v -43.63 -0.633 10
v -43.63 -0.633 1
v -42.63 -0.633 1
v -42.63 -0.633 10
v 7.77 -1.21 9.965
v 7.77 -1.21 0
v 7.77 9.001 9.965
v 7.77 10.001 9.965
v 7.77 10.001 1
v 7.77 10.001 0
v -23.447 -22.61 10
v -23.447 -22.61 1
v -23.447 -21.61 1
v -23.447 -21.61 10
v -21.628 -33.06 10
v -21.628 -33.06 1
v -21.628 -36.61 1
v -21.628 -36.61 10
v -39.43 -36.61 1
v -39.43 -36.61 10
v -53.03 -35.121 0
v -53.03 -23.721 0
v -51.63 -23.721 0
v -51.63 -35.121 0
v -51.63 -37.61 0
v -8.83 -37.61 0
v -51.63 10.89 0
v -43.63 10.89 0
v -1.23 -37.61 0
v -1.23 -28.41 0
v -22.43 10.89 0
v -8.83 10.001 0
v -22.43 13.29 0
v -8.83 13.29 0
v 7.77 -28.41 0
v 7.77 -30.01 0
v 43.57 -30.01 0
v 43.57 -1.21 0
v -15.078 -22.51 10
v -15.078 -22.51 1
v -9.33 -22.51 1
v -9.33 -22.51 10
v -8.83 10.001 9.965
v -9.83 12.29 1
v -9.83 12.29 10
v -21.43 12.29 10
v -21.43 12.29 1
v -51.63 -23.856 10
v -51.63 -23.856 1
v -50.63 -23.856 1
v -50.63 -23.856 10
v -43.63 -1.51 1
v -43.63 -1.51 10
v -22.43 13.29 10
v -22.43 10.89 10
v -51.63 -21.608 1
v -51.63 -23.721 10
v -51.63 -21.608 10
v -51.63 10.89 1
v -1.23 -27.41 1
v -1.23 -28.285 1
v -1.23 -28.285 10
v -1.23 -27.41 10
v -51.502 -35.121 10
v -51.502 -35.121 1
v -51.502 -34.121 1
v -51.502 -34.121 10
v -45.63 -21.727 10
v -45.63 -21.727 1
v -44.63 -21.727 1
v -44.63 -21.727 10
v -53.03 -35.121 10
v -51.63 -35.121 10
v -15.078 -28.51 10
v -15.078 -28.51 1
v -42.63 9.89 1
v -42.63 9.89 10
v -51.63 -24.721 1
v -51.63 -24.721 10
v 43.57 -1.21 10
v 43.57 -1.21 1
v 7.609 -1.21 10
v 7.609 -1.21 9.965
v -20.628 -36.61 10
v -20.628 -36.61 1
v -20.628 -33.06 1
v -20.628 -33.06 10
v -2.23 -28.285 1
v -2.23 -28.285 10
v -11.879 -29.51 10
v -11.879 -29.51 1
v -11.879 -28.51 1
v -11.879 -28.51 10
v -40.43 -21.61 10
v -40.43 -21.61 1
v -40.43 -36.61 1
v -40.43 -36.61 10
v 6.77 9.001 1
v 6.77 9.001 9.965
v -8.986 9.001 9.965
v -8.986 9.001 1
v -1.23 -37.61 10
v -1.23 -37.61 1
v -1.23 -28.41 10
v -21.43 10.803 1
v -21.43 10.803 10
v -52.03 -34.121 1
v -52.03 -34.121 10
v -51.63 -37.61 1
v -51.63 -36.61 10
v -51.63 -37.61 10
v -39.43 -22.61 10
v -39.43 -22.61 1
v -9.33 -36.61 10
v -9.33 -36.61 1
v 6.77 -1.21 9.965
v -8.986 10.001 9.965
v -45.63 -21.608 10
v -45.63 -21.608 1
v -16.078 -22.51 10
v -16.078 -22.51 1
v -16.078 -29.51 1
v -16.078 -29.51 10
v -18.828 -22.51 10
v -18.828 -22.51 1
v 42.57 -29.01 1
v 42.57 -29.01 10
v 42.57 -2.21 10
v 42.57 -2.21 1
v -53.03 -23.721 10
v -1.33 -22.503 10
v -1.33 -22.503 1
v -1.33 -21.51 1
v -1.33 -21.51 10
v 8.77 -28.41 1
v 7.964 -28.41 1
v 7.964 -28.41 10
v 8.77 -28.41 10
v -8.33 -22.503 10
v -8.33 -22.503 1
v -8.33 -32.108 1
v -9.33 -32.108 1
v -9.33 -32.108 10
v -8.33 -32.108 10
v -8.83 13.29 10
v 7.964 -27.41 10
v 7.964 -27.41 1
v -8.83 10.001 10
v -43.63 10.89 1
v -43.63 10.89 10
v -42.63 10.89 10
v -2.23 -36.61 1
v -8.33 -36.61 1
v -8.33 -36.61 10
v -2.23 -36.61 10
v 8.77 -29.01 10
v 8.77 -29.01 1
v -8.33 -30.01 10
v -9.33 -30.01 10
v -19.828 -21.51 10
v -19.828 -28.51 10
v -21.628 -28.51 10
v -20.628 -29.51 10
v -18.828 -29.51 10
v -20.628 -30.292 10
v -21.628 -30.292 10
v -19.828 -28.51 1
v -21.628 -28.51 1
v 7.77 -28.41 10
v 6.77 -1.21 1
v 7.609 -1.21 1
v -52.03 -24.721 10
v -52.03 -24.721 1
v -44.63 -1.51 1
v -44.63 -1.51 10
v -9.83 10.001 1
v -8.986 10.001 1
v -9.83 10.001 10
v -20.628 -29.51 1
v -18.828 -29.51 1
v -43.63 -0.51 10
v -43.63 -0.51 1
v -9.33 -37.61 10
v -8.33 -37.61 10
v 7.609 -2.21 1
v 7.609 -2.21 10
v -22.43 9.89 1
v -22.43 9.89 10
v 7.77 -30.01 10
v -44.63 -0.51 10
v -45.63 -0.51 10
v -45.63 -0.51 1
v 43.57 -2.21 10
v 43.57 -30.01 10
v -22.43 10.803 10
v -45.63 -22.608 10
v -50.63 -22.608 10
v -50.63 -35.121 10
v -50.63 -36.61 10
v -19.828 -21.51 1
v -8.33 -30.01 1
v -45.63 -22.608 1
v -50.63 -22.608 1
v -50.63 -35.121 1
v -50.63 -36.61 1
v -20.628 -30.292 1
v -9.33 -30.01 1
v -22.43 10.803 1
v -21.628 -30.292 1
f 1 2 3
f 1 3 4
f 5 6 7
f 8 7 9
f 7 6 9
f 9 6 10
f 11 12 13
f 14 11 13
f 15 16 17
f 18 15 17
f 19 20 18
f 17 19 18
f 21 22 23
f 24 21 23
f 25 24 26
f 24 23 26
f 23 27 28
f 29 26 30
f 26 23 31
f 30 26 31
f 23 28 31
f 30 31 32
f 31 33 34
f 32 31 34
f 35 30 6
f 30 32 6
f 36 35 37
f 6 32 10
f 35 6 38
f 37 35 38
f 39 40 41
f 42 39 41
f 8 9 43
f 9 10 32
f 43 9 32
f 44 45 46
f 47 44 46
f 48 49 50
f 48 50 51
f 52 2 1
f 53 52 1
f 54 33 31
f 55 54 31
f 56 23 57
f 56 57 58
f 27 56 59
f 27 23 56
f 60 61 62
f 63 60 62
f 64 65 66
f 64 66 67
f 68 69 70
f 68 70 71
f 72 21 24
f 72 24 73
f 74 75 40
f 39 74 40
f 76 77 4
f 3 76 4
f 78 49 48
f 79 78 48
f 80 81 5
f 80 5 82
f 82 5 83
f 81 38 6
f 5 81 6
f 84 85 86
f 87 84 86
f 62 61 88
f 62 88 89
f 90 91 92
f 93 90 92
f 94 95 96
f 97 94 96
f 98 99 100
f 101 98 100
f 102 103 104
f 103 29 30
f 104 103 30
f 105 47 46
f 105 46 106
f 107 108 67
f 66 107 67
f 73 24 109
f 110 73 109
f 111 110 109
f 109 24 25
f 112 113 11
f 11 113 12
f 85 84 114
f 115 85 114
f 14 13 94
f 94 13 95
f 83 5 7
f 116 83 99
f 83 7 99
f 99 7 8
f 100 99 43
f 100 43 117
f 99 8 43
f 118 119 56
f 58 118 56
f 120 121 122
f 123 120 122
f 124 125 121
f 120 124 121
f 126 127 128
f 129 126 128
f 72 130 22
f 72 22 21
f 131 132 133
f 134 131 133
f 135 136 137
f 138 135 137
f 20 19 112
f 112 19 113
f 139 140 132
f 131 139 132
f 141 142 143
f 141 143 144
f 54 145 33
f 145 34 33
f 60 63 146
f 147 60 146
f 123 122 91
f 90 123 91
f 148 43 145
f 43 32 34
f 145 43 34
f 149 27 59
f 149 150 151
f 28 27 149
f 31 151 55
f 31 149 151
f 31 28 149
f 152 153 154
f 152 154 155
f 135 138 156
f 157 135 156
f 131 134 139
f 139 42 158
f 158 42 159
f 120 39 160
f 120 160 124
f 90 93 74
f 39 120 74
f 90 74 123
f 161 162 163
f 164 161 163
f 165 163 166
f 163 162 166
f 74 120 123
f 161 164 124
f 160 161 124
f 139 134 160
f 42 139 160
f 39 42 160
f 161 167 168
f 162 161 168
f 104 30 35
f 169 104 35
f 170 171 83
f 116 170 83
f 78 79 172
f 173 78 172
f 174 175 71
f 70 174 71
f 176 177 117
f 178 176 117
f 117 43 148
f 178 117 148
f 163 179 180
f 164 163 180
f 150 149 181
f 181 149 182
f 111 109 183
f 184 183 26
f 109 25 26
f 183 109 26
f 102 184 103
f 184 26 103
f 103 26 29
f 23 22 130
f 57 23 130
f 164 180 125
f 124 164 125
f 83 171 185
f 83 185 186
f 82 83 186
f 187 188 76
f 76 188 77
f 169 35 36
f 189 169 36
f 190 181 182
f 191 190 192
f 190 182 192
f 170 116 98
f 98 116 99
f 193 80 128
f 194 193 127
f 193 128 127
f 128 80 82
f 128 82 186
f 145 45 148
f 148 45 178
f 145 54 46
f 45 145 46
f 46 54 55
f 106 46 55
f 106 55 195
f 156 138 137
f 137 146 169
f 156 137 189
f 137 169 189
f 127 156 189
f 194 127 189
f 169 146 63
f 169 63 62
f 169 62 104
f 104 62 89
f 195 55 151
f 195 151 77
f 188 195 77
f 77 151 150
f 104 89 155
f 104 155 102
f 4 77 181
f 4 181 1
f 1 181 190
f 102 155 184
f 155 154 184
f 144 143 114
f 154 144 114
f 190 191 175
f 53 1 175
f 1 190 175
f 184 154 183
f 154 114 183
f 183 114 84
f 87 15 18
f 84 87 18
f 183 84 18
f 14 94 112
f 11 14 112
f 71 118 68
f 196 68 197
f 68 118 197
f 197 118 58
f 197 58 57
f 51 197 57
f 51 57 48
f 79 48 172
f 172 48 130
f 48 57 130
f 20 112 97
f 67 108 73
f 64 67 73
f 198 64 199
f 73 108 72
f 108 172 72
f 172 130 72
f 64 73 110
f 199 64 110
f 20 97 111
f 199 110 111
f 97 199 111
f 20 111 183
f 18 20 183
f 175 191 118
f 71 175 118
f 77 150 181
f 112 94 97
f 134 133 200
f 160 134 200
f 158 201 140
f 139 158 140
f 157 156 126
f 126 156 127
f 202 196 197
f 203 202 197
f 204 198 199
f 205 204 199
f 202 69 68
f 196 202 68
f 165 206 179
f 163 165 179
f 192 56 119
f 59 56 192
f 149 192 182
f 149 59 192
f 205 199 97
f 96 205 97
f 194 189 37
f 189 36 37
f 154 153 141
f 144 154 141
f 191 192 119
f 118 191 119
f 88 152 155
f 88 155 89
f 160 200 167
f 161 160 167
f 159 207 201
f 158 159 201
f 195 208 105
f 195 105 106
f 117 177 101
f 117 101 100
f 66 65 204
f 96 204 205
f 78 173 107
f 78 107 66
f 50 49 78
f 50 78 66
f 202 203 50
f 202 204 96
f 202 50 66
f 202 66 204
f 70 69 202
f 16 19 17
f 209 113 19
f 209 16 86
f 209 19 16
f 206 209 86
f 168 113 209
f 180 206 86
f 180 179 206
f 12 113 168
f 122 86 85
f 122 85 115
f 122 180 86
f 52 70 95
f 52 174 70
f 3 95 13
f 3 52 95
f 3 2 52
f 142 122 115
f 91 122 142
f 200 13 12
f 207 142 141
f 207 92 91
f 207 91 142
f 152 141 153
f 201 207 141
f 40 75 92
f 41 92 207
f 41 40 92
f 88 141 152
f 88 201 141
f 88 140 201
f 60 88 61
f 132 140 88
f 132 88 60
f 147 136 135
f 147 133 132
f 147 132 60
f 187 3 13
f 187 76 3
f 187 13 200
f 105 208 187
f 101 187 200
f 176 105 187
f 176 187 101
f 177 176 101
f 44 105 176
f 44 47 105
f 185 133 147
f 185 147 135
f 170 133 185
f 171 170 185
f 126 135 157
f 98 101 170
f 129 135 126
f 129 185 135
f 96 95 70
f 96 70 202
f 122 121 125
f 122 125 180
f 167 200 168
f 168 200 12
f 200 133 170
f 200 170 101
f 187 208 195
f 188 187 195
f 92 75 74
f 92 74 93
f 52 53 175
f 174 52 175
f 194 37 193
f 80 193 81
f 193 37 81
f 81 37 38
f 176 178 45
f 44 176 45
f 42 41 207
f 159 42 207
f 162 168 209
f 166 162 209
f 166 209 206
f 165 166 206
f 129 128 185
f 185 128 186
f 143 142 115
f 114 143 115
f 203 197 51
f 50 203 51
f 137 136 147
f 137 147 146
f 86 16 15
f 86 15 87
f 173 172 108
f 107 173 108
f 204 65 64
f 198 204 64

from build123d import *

# Parameters (mm, degrees)
F0_W      = 6
F0_H      = 0.002
F0_W_2    = 1.4
F0_H_2    = 11.4
F0_W_3    = 13.6
F0_H_3    = 0.08
F0_H_4    = 16.002
F0_W_4    = 8.8
F0_H_5    = 21.098
F0_W_5    = 7.6
F0_H_6    = 7.8852218396
F1_DEPTH  = 1
F2_W      = 11.4
F2_H      = 9
F3_DEPTH  = 1
F4_W      = 1.4
F4_H      = 10
F5_DEPTH  = 1
F6_W      = 2.2483316878
F6_H      = 10
F7_DEPTH  = 1
F8_W      = 6
F8_H      = 10
F9_DEPTH  = 1
F10_W     = 21.2175605533
F10_H     = 10
F11_DEPTH = 1
F12_W     = 2
F12_H     = 10
F13_DEPTH = 1
F14_W     = 11.5231698511
F14_H     = 10
F15_DEPTH = 1
F16_W     = 21.2
F16_H     = 10
F17_DEPTH = 1
F18_W     = 2.4870870446
F18_H     = 10
F19_DEPTH = 1
F20_W     = 13.6
F20_H     = 10
F21_DEPTH = 1
F22_W     = 3.2888815676
F22_H     = 10
F23_DEPTH = 1
F24_W     = 16.7565354139
F24_H     = 9.9645610899
F25_DEPTH = 1
F26_W     = 11.2111184324
F26_H     = 9.9645610899
F27_DEPTH = 1
F28_W     = 35.9614706893
F28_H     = 10
F29_DEPTH = 1
F30_W     = 28.8
F30_H     = 10
F31_DEPTH = 1
F32_W     = 35.8
F32_H     = 10
F33_DEPTH = 1
F34_W     = 1.6
F34_H     = 10
F35_DEPTH = 1
F36_W     = 9.1939088942
F36_H     = 10
F37_DEPTH = 1
F38_W     = 9.3250730319
F38_H     = 10
F39_DEPTH = 1
F40_W     = 49.9146888159
F40_H     = 10
F41_DEPTH = 1
F42_W     = 50.4
F42_H     = 10
F43_DEPTH = 25.4
F44_W     = 2.4892
F44_H     = 10
F45_DEPTH = 1
F46_W     = 1.5276186168
F46_H     = 10
F47_DEPTH = 1
F48_W     = 8
F48_H     = 32.498
F49_DEPTH = 1
F50_W     = 1
F50_H     = 15
F50_H_2   = 1
F50_W_2   = 15.9833405107
F50_H_3   = 4.55
F50_H_4   = 2.7679902027
F50_H_5   = 0.7820097973
F50_H_6   = 6
F50_W_3   = 2.749538143
F50_H_7   = 7.5
F50_W_4   = 3.1995763704
F50_H_8   = 2.0981409718
F50_H_9   = 5.5018590282
F51_DEPTH = 9
F52_DEPTH = 9
F53_DEPTH = 9


with BuildPart() as f1:
    # F0 (on Top) → F1 (new body)
    with BuildSketch(Plane.XY):
        with Locations((-48.6298836529, -21.6088678897)):
            Rectangle(F0_W, F0_H)
        Polygon((-45.6298836529, -21.6098678897), (-51.6298836529, -21.6098678897), (-51.6298836529, -23.7206678897), (-51.6298836529, -35.1206678897), (-51.6298836529, -37.6098678897), (-40.4298836529, -37.6098678897), (-40.4298836529, -21.6098678897), align=None)
        Polygon((-45.6298836529, -21.6078678897), (-45.6298836529, -21.6098678897), (-40.4298836529, -21.6098678897), (-31.2298836529, -21.6098678897), (-31.2298836529, -21.6078678897), align=None)
        with Locations((-52.3298836529, -29.4206678897)):
            Rectangle(F0_W_2, F0_H_2)
        Polygon((-31.2298836529, -21.6098678897), (-40.4298836529, -21.6098678897), (-40.4298836529, -37.6098678897), (-22.4298836529, -37.6098678897), (-22.4298836529, -21.6078678897), (-31.2298836529, -21.6078678897), align=None)
        Polygon((-45.6298836529, -0.5098678897), (-45.6298836529, -21.6078678897), (-31.2298836529, -21.6078678897), (-31.2298836529, -0.5098678897), (-43.6298836529, -0.5098678897), align=None)
        with Locations((-15.6298836529, -37.6498678897)):
            Rectangle(F0_W_3, F0_H_3)
        with Locations((-15.6298836529, -29.6088678897)):
            Rectangle(F0_W_3, F0_H_4)
        Polygon((-43.6298836529, 10.8901321103), (-43.6298836529, -0.5098678897), (-31.2298836529, -0.5098678897), (-22.4298836529, -0.5098678897), (-22.4298836529, 10.8901321103), align=None)
        Polygon((-22.4298836529, -0.5098678897), (-22.4298836529, -21.6078678897), (-8.8298836529, -21.6078678897), (-8.8298836529, -13.7226460502), (-8.8298836529, 10.0012505427), (-8.8298836529, 13.2901321103), (-22.4298836529, 13.2901321103), (-22.4298836529, 10.8901321103), align=None)
        Polygon((-8.8298836529, -21.6078678897), (-8.8298836529, -37.6098678897), (-1.2298836529, -37.6098678897), (-1.2298836529, -28.4098678897), (-1.2298836529, -21.6078678897), align=None)
        Polygon((-8.8298836529, 10.0012505427), (-8.8298836529, -13.7226460502), (-1.2298836529, -13.7226460502), (7.7701163471, -13.7226460502), (7.7701163471, -1.2098678897), (7.7701163471, 10.0012505427), align=None)
        Polygon((-1.2298836529, -13.7226460502), (-1.2298836529, -21.6078678897), (-1.2298836529, -28.4098678897), (7.7701163471, -28.4098678897), (7.7701163471, -13.7226460502), align=None)
        Polygon((7.7701163471, -13.7226460502), (7.7701163471, -28.4098678897), (7.7701163471, -30.0098678897), (43.5701163471, -30.0098678897), (43.5701163471, -1.2098678897), (7.7701163471, -1.2098678897), align=None)
        with Locations((-26.8298836529, -11.0588678897)):
            Rectangle(F0_W_4, F0_H_5)
        with Locations((-5.0298836529, -17.6652569699)):
            Rectangle(F0_W_5, F0_H_6)
    extrude(amount=F1_DEPTH)

    # F2 (on face) → F3 (join)
    with BuildSketch(Plane(origin=(-53.0298836529, 0, 0), x_dir=(0, -1, 0), z_dir=(-1, 0, 0))):
        with Locations((29.4206678897, 5.5)):
            Rectangle(F2_W, F2_H)
    extrude(amount=-F3_DEPTH)

    # F4 (on face) → F5 (join)
    with BuildSketch(Plane(origin=(0, -23.7206678897, 0), x_dir=(-1, 0, 0), z_dir=(0, 1, 0))):
        with Locations((52.3298836529, 5)):
            Rectangle(F4_W, F4_H)
    extrude(amount=-F5_DEPTH)

    # F6 (on face) → F7 (join)
    with BuildSketch(Plane(origin=(-51.6298836529, 0, 0), x_dir=(0, -1, 0), z_dir=(-1, 0, 0))):
        with Locations((22.7320337336, 5)):
            Rectangle(F6_W, F6_H)
    extrude(amount=-F7_DEPTH)

    # F8 (on face) → F9 (join)
    with BuildSketch(Plane(origin=(0, -21.6078678897, 0), x_dir=(-1, 0, 0), z_dir=(0, 1, 0))):
        with Locations((48.6298836529, 5)):
            Rectangle(F8_W, F8_H)
    extrude(amount=-F9_DEPTH)

    # F10 (on face) → F11 (join)
    with BuildSketch(Plane(origin=(-45.6298836529, 0, 0), x_dir=(0, -1, 0), z_dir=(-1, 0, 0))):
        with Locations((11.1186481663, 5)):
            Rectangle(F10_W, F10_H)
    extrude(amount=-F11_DEPTH)

    # F12 (on face) → F13 (join)
    with BuildSketch(Plane(origin=(0, -0.5098678897, 0), x_dir=(-1, 0, 0), z_dir=(0, 1, 0))):
        with Locations((44.6298836529, 5)):
            Rectangle(F12_W, F12_H)
    extrude(amount=-F13_DEPTH)

    # F14 (on face) → F15 (join)
    with BuildSketch(Plane(origin=(-43.6298836529, 0, 0), x_dir=(0, -1, 0), z_dir=(-1, 0, 0))):
        with Locations((-5.1285471847, 5)):
            Rectangle(F14_W, F14_H)
    extrude(amount=-F15_DEPTH)

    # F16 (on face) → F17 (join)
    with BuildSketch(Plane(origin=(0, 10.8901321103, 0), x_dir=(-1, 0, 0), z_dir=(0, 1, 0))):
        with Locations((33.0298836529, 5)):
            Rectangle(F16_W, F16_H)
    extrude(amount=-F17_DEPTH)

    # F18 (on face) → F19 (join)
    with BuildSketch(Plane(origin=(-22.4298836529, 0, 0), x_dir=(0, -1, 0), z_dir=(-1, 0, 0))):
        with Locations((-12.046588588, 5)):
            Rectangle(F18_W, F18_H)
    extrude(amount=-F19_DEPTH)

    # F20 (on face) → F21 (join)
    with BuildSketch(Plane(origin=(0, 13.2901321103, 0), x_dir=(-1, 0, 0), z_dir=(0, 1, 0))):
        with Locations((15.6298836529, 5)):
            Rectangle(F20_W, F20_H)
    extrude(amount=-F21_DEPTH)

    # F22 (on face) → F23 (join)
    with BuildSketch(Plane.YZ.offset(-8.8298836529)):
        with Locations((11.6456913265, 5)):
            Rectangle(F22_W, F22_H)
    extrude(amount=-F23_DEPTH)

    # F24 (on face) → F25 (join)
    with BuildSketch(Plane(origin=(0, 10.0012505427, 0), x_dir=(-1, 0, 0), z_dir=(0, 1, 0))):
        with Locations((0.6081513599, 4.9822805449)):
            Rectangle(F24_W, F24_H)
    extrude(amount=-F25_DEPTH)

    # F26 (on face) → F27 (join)
    with BuildSketch(Plane.YZ.offset(7.7701163471)):
        with Locations((4.3956913265, 4.9822805449)):
            Rectangle(F26_W, F26_H)
    extrude(amount=-F27_DEPTH)

    # F28 (on face) → F29 (join)
    with BuildSketch(Plane(origin=(0, -1.2098678897, 0), x_dir=(-1, 0, 0), z_dir=(0, 1, 0))):
        with Locations((-25.5893810024, 5)):
            Rectangle(F28_W, F28_H)
    extrude(amount=-F29_DEPTH)

    # F30 (on face) → F31 (join)
    with BuildSketch(Plane.YZ.offset(43.5701163471)):
        with Locations((-15.6098678897, 5)):
            Rectangle(F30_W, F30_H)
    extrude(amount=-F31_DEPTH)

    # F32 (on face) → F33 (join)
    with BuildSketch(Plane.XZ.offset(30.0098678897)):
        with Locations((25.6701163471, 5)):
            Rectangle(F32_W, F32_H)
    extrude(amount=-F33_DEPTH)

    # F34 (on face) → F35 (join)
    with BuildSketch(Plane(origin=(7.7701163471, 0, 0), x_dir=(0, -1, 0), z_dir=(-1, 0, 0))):
        with Locations((29.2098678897, 5)):
            Rectangle(F34_W, F34_H)
    extrude(amount=-F35_DEPTH)

    # F36 (on face) → F37 (join)
    with BuildSketch(Plane.XZ.offset(28.4098678897)):
        with Locations((3.3670707942, 5)):
            Rectangle(F36_W, F36_H)
    extrude(amount=-F37_DEPTH)

    # F38 (on face) → F39 (join)
    with BuildSketch(Plane.YZ.offset(-1.2298836529)):
        with Locations((-32.9473313738, 5)):
            Rectangle(F38_W, F38_H)
    extrude(amount=-F39_DEPTH)

    # F40 (on face) → F41 (join)
    with BuildSketch(Plane.XZ.offset(37.6098678897)):
        with Locations((-26.672539245, 5)):
            Rectangle(F40_W, F40_H)
    extrude(amount=-F41_DEPTH)

    # F42 (on face) → F43 (cut)
    with BuildSketch(Plane.XZ.offset(37.6098678897)):
        with Locations((-26.4298836529, 5)):
            Rectangle(F42_W, F42_H)
    extrude(amount=F43_DEPTH, mode=Mode.SUBTRACT)

    # F44 (on face) → F45 (join)
    with BuildSketch(Plane(origin=(-51.6298836529, 0, 0), x_dir=(0, -1, 0), z_dir=(-1, 0, 0))):
        with Locations((36.3652678897, 5)):
            Rectangle(F44_W, F44_H)
    extrude(amount=-F45_DEPTH)

    # F46 (on face) → F47 (join)
    with BuildSketch(Plane.XZ.offset(35.1206678897)):
        with Locations((-52.2660743445, 5)):
            Rectangle(F46_W, F46_H)
    extrude(amount=-F47_DEPTH)

    # F48 (on Top) → F49 (join)
    with BuildSketch(Plane.XY):
        with Locations((-47.6298836529, -5.3588678897)):
            Rectangle(F48_W, F48_H)
    extrude(amount=F49_DEPTH)

    # F50 (on face) → F51 (join)
    with BuildSketch(Plane.XY.offset(1)):
        with Locations((-39.9298836529, -30.1098678897)):
            Rectangle(F50_W, F50_H)
        with Locations((-39.9298836529, -22.1098678897)):
            Rectangle(F50_W, F50_H_2)
        with Locations((-31.4382133976, -22.1098678897)):
            Rectangle(F50_W_2, F50_H_2)
        with Locations((-21.1280035675, -35.3348678897)):
            Rectangle(F50_W, F50_H_3)
        with Locations((-21.1280035675, -31.6758727883)):
            Rectangle(F50_W, F50_H_4)
        with Locations((-21.1280035675, -29.9008727883)):
            Rectangle(F50_W, F50_H_5)
        with Locations((-21.1280035675, -29.0098678897)):
            Rectangle(F50_W, F50_H_2)
        Polygon((-20.6280035675, -28.5098678897), (-20.6280035675, -29.5098678897), (-18.8280035675, -29.5098678897), (-18.8280035675, -28.5098678897), (-19.8280035675, -28.5098678897), align=None)
        with Locations((-19.3280035675, -25.5098678897)):
            Rectangle(F50_W, F50_H_6)
        with Locations((-19.3280035675, -22.0098678897)):
            Rectangle(F50_W, F50_H_2)
        with Locations((-17.4532344959, -22.0098678897)):
            Rectangle(F50_W_3, F50_H_2)
        with Locations((-15.5784654244, -22.0098678897)):
            Rectangle(F50_W, F50_H_2)
        with Locations((-15.5784654244, -25.5098678897)):
            Rectangle(F50_W, F50_H_6)
        Polygon((-15.0784654244, -21.5098678897), (-15.0784654244, -22.5098678897), (-9.3298836529, -22.5098678897), (-9.3298836529, -22.4098678897), (-8.3298836529, -22.4098678897), (-8.3298836529, -21.5098678897), align=None)
        with Locations((-15.5784654244, -29.0098678897)):
            Rectangle(F50_W, F50_H_2)
        with Locations((-8.8298836529, -26.2598678897)):
            Rectangle(F50_W, F50_H_7)
        Polygon((-9.3298836529, -22.4098678897), (-9.3298836529, -22.5098678897), (-8.3298836529, -22.5098678897), (-8.3298836529, -22.5030053407), (-8.3298836529, -22.4098678897), align=None)
        with Locations((-13.4786772393, -29.0098678897)):
            Rectangle(F50_W_4, F50_H_2)
        Polygon((-1.3298836529, -21.5098678897), (-8.3298836529, -21.5098678897), (-8.3298836529, -22.4098678897), (-8.3298836529, -22.5030053407), (-1.3298836529, -22.5030053407), align=None)
        with Locations((-8.8298836529, -31.0589383756)):
            Rectangle(F50_W, F50_H_8)
        with Locations((-8.8298836529, -34.8589383756)):
            Rectangle(F50_W, F50_H_9)
    extrude(amount=F51_DEPTH)

    # F50 (on face) → F52 (cut)
    with BuildSketch(Plane.XY.offset(1)):
        with Locations((-21.1280035675, -31.6758727883)):
            Rectangle(F50_W, F50_H_4)
    extrude(amount=F52_DEPTH, mode=Mode.SUBTRACT)

    # F50 (on face) → F53 (cut)
    with BuildSketch(Plane.XY.offset(1)):
        with Locations((-8.8298836529, -31.0589383756)):
            Rectangle(F50_W, F50_H_8)
    extrude(amount=F53_DEPTH, mode=Mode.SUBTRACT)


solid = f1.part
